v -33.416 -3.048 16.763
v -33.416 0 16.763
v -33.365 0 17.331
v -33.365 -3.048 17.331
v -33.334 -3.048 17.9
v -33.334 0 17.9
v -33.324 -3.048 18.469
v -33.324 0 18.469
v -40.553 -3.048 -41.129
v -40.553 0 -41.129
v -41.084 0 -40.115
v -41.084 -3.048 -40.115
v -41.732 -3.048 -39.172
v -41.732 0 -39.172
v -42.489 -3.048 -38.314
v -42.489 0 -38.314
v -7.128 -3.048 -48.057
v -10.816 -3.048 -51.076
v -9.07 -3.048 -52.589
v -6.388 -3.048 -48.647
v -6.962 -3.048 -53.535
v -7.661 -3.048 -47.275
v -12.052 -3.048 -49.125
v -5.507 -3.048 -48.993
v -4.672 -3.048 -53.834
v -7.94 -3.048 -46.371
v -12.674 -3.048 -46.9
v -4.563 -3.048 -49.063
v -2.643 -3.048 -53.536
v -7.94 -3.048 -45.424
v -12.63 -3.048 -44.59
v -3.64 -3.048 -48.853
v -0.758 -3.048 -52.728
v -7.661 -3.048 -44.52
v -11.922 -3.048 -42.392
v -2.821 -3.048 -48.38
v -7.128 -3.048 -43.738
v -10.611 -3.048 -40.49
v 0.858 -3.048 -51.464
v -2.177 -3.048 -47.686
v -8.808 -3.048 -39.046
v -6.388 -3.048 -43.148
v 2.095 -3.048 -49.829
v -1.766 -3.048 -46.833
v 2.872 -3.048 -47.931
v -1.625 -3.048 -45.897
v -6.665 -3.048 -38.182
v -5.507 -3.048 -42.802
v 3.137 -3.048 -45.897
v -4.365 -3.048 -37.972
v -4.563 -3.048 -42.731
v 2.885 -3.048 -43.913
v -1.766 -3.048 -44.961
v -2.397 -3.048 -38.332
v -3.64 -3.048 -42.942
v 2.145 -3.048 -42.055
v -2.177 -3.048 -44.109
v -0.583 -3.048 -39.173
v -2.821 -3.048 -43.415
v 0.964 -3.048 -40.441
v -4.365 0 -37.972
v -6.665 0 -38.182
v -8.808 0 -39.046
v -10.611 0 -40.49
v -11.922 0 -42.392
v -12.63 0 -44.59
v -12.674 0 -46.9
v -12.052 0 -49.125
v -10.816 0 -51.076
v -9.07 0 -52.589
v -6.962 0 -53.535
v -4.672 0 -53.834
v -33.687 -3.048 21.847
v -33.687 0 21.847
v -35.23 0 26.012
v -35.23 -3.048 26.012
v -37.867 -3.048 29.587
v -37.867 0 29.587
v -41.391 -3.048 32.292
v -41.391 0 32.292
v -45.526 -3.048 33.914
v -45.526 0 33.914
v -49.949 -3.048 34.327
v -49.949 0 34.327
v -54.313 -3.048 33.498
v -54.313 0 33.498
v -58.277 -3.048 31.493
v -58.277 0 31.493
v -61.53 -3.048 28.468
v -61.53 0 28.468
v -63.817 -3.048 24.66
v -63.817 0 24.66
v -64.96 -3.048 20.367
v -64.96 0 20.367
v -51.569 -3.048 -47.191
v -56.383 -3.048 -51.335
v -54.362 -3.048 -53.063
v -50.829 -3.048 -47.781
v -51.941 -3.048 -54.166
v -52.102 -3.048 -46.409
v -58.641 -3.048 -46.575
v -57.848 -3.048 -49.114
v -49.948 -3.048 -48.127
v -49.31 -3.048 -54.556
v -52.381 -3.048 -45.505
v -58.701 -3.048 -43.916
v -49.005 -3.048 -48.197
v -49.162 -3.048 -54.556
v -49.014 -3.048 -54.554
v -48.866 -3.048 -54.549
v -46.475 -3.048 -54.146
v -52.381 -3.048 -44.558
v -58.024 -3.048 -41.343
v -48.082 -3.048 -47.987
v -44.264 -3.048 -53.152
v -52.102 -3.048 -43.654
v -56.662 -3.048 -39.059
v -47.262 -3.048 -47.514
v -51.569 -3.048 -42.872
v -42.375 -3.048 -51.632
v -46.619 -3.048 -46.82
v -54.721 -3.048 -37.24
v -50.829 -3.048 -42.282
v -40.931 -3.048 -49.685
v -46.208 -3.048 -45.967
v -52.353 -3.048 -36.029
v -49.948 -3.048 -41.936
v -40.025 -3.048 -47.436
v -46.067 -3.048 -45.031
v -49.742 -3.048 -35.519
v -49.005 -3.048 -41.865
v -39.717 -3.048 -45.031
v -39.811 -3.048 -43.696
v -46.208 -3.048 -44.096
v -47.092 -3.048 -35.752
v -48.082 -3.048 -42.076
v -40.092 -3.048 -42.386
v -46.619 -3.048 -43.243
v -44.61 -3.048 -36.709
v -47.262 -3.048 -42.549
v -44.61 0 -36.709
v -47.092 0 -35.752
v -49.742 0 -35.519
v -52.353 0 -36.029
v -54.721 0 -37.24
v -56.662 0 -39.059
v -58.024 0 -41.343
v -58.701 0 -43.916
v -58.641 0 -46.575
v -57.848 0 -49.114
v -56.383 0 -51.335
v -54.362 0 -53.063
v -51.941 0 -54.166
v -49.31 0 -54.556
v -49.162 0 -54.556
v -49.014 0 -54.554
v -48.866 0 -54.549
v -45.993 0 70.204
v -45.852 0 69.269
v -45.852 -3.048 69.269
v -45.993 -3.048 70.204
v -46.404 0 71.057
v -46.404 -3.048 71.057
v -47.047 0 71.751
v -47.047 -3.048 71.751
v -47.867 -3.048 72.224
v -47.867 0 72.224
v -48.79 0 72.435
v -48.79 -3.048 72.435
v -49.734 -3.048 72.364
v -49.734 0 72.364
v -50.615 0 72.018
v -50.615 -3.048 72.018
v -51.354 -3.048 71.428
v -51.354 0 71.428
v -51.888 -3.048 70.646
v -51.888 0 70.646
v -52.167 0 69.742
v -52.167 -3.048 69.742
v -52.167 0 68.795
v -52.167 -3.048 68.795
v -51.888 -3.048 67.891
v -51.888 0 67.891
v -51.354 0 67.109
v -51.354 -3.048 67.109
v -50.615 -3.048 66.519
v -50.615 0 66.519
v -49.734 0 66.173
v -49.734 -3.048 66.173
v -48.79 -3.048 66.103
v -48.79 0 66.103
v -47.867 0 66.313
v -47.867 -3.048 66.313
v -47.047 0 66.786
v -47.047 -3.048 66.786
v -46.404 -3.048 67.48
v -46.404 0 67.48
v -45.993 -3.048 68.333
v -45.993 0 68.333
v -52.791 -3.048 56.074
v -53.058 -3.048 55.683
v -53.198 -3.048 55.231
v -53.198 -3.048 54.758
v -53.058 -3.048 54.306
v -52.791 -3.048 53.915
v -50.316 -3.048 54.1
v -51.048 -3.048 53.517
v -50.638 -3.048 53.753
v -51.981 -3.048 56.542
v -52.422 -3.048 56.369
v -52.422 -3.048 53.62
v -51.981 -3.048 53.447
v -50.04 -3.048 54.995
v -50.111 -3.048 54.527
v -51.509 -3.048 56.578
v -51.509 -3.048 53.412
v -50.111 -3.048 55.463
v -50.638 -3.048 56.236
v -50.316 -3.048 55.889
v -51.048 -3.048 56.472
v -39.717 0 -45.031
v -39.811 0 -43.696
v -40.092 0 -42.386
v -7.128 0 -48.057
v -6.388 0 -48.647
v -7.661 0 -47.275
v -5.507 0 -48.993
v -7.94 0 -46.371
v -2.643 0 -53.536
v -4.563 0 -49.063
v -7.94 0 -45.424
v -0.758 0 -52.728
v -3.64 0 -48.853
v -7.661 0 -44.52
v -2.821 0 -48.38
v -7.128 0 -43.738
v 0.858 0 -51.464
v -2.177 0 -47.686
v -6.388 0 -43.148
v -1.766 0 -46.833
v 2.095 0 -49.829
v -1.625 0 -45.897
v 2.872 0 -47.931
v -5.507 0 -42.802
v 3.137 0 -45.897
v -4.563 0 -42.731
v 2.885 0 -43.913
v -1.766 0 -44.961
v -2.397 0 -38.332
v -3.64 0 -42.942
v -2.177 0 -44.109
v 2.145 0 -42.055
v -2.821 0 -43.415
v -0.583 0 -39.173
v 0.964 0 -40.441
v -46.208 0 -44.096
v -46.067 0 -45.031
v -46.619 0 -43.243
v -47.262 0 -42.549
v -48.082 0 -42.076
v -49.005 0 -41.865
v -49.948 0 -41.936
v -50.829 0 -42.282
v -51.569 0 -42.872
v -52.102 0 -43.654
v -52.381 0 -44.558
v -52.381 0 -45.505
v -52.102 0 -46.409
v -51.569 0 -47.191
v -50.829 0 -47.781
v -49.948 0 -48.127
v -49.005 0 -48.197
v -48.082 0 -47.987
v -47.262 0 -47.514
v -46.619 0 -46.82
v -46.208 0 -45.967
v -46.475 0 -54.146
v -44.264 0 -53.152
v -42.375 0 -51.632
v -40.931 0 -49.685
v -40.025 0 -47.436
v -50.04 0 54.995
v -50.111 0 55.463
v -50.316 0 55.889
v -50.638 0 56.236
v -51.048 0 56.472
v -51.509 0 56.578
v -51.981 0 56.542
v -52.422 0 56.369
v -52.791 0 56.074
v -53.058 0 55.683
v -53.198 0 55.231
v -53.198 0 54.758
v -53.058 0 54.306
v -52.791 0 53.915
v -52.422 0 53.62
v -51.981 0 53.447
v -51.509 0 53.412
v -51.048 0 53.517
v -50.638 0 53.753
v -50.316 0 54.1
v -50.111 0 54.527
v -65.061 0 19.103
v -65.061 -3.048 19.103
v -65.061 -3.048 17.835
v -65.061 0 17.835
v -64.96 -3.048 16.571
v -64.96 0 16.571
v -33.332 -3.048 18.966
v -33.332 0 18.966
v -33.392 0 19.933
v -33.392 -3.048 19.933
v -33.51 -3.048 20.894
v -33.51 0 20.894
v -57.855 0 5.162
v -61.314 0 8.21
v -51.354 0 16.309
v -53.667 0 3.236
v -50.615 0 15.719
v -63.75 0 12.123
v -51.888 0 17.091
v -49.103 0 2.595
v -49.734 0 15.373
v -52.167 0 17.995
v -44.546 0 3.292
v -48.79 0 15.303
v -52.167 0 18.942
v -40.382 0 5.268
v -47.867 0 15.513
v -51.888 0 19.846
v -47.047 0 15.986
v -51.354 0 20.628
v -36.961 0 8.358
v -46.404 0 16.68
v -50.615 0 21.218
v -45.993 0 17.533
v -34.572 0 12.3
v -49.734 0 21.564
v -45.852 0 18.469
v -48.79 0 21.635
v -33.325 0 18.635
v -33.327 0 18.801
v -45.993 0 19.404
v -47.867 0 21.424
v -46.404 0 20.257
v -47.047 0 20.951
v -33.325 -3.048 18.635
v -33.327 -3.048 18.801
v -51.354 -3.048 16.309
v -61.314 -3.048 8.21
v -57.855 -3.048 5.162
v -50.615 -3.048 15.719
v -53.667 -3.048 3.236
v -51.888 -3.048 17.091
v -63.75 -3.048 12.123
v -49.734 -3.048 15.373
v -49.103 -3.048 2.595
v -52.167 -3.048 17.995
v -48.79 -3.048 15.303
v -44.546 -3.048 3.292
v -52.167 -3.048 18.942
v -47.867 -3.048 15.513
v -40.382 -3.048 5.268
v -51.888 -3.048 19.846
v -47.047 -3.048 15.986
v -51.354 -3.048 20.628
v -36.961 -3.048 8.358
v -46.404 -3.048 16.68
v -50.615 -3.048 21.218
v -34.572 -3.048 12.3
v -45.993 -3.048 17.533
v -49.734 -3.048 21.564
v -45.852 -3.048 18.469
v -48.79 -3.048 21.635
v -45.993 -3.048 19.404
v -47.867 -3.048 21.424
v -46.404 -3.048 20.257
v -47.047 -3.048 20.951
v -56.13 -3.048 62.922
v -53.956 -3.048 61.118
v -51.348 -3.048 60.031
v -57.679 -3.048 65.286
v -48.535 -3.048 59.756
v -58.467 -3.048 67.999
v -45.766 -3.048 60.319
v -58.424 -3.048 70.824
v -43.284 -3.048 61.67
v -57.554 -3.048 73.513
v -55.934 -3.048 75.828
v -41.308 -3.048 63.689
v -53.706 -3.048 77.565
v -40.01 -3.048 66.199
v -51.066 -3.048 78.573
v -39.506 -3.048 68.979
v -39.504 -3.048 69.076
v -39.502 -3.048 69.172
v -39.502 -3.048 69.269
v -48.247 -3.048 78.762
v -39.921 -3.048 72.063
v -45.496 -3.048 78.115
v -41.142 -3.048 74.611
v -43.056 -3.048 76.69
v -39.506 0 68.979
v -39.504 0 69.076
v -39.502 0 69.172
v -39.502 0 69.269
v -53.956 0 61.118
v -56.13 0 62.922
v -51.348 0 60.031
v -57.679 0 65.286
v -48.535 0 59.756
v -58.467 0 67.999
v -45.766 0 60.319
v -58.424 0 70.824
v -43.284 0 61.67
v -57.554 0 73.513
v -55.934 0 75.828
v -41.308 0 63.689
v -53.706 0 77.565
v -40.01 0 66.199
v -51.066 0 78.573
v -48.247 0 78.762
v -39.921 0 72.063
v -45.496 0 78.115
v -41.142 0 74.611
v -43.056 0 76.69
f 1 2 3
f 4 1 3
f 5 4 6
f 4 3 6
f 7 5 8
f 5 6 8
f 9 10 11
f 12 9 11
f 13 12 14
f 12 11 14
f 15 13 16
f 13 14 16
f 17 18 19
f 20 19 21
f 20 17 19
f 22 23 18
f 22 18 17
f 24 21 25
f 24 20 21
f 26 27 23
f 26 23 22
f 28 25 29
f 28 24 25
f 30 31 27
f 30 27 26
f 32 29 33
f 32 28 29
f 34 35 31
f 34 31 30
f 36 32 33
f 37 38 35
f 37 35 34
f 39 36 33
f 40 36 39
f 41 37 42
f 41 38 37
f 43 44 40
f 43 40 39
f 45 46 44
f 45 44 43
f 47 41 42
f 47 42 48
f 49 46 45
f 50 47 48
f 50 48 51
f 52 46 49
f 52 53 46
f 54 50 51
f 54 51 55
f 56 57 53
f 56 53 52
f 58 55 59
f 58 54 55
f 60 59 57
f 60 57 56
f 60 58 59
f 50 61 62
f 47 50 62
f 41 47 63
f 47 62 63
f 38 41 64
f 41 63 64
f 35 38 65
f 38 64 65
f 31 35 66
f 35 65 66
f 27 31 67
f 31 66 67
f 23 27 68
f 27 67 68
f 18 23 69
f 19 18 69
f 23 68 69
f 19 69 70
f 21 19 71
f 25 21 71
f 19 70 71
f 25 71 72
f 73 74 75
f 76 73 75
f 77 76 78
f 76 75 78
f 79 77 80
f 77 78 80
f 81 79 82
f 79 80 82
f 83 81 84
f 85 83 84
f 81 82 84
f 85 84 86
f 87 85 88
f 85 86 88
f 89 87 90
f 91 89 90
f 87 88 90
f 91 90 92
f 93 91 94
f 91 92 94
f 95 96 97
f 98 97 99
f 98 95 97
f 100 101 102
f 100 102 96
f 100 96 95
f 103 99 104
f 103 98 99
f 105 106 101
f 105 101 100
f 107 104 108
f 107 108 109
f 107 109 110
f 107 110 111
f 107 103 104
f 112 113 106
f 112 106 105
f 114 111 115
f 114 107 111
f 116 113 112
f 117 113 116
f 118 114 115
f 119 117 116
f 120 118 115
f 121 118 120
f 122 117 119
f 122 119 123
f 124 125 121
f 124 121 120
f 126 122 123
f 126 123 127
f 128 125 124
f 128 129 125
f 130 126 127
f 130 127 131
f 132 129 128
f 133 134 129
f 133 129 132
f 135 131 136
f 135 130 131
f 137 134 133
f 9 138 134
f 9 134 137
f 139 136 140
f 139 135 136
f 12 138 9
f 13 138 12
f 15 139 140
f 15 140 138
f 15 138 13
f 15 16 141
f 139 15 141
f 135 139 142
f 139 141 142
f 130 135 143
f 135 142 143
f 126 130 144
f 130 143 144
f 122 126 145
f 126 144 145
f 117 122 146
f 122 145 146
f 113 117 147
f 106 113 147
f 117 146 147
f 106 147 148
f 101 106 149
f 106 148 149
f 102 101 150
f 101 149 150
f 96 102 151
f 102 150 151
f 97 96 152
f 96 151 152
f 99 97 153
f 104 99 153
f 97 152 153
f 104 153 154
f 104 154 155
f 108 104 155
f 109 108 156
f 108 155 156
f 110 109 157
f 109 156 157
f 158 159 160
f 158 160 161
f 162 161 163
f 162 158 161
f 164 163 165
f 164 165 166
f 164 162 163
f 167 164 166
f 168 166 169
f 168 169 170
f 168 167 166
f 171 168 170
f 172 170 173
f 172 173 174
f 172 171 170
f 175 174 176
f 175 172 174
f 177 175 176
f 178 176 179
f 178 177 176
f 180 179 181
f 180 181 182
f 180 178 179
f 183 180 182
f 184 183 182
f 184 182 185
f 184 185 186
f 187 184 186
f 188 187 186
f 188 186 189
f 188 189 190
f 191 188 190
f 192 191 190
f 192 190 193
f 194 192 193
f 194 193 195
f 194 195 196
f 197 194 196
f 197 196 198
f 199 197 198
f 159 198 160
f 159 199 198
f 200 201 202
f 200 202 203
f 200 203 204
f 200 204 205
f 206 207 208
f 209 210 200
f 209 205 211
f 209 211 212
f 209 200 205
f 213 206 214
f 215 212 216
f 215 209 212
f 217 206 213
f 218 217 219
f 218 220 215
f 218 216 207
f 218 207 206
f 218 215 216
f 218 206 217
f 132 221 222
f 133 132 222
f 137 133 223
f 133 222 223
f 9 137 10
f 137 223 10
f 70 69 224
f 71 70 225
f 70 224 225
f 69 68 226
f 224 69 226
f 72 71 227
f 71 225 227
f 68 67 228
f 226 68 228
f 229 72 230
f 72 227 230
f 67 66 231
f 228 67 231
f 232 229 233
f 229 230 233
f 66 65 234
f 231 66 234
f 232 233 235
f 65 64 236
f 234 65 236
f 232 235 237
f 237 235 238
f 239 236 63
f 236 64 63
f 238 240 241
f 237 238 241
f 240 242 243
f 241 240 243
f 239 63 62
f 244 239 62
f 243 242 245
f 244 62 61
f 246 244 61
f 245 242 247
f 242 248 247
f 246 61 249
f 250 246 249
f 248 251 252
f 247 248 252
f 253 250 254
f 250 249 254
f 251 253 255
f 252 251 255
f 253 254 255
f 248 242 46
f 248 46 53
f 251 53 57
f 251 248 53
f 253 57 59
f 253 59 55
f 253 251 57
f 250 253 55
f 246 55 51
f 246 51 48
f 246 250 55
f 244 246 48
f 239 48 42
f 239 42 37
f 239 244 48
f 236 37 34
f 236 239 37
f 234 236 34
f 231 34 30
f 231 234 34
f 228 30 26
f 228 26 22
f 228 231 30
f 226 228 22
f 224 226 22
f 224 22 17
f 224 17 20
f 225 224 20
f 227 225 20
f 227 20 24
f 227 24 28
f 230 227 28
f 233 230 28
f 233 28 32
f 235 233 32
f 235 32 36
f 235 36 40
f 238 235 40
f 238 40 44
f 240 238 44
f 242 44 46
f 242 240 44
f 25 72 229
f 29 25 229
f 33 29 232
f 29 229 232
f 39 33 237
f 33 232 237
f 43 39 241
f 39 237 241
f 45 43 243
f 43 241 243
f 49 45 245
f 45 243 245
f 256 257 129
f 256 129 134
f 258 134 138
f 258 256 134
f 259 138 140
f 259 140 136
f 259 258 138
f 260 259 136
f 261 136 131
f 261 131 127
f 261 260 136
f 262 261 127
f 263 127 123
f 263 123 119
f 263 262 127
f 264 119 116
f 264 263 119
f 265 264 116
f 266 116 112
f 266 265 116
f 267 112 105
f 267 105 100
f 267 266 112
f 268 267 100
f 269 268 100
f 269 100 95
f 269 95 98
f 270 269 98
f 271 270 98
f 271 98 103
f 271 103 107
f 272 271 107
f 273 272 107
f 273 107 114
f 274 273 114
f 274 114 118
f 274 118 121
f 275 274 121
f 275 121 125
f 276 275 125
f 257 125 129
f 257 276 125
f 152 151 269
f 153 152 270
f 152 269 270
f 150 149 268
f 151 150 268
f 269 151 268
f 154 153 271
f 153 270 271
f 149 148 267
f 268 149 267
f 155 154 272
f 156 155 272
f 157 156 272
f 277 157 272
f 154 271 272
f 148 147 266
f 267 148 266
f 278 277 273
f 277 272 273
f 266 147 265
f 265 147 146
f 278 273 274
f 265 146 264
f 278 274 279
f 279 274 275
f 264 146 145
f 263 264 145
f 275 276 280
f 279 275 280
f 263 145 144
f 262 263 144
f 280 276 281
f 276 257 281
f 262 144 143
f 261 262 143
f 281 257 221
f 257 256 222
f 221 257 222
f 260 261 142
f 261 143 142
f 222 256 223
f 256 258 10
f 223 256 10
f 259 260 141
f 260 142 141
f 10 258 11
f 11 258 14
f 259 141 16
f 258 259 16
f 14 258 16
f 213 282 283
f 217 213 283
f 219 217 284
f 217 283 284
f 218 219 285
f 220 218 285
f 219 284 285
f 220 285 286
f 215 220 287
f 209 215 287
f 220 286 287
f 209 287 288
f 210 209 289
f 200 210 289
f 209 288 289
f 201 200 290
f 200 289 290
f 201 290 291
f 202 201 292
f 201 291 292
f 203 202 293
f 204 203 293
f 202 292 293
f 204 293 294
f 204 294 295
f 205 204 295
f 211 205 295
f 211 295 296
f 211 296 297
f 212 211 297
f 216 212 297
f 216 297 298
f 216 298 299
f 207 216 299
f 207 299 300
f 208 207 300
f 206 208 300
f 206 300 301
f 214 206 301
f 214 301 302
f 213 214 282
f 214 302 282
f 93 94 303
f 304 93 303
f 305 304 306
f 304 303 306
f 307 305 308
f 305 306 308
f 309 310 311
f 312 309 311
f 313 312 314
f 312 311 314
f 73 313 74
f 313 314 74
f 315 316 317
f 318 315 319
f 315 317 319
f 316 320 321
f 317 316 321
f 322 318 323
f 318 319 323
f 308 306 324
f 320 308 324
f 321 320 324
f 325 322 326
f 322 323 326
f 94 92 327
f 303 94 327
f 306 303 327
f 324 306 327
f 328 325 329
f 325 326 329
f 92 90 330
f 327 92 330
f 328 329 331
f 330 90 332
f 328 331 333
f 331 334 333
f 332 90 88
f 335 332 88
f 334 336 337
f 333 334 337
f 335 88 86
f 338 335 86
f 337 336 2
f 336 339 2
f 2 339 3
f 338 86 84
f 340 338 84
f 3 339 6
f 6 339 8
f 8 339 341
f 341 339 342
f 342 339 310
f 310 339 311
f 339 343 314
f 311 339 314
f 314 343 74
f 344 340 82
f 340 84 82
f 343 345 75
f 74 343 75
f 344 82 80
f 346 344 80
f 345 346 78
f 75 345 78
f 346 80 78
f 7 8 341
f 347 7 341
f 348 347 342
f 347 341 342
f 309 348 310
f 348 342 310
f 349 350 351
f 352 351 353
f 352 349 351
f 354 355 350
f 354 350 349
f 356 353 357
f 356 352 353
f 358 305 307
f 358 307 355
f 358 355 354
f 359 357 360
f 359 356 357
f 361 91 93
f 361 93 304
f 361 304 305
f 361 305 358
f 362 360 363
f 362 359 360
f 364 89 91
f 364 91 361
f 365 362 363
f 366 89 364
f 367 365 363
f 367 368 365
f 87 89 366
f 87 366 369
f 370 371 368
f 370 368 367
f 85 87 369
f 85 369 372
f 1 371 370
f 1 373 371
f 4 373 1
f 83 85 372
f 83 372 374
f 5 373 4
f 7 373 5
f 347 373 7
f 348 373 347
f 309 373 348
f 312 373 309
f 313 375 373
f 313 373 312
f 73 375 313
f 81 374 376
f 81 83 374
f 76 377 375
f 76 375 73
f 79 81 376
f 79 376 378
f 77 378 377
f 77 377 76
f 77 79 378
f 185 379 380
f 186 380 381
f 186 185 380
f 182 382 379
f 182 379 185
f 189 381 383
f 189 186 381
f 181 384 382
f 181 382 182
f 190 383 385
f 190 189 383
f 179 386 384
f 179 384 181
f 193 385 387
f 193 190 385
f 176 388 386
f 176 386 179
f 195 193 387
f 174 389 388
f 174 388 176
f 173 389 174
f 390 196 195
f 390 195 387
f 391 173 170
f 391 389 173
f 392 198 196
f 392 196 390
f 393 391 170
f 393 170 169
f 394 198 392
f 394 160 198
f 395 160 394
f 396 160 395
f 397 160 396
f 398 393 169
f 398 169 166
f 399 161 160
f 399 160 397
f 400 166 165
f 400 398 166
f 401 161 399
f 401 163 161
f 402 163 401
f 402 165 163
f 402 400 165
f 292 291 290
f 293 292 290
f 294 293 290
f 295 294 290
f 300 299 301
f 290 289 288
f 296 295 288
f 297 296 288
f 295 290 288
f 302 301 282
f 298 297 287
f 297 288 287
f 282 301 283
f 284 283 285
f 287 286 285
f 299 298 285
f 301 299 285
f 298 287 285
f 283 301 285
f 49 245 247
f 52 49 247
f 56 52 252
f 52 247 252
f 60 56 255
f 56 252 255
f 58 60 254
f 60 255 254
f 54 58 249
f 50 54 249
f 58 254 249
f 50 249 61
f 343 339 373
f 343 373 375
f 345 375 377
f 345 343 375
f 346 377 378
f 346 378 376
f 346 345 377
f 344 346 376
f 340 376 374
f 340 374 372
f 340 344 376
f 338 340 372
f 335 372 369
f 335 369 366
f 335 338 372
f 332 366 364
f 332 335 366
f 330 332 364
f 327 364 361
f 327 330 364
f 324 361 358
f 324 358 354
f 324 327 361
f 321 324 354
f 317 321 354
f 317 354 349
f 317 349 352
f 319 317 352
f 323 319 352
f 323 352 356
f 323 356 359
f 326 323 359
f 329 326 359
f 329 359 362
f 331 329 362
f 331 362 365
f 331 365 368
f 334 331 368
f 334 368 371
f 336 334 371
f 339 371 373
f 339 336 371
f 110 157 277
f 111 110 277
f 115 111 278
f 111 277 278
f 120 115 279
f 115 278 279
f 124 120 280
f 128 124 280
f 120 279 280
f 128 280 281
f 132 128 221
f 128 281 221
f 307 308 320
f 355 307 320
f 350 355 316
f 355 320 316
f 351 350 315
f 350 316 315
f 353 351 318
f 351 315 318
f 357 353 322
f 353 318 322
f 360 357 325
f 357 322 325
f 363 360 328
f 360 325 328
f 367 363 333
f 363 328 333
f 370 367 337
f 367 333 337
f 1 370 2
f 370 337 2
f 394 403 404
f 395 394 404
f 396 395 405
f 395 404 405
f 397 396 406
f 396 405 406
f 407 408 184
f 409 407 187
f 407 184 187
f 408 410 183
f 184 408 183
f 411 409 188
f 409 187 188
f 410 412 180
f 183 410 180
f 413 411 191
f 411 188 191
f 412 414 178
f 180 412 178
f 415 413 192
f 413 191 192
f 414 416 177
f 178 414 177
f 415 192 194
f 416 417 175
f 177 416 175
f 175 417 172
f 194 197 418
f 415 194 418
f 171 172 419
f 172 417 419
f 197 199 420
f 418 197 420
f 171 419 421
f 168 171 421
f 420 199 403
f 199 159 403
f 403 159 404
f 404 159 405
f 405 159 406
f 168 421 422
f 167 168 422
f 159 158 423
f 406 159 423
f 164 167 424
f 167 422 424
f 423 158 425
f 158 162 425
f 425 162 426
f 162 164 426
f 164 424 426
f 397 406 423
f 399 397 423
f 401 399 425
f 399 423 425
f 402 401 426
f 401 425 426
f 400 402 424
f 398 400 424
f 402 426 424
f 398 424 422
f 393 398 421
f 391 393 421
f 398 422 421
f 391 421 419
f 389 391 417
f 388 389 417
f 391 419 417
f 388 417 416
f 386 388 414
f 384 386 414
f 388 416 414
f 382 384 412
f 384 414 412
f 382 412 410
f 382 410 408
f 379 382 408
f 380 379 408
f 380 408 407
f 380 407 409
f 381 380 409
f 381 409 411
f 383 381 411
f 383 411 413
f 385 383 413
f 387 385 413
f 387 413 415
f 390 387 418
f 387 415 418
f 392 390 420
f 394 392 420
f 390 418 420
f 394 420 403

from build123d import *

# Parameters (mm, degrees)
F0_R     = 3.175
F1_DEPTH = 3.048
F0_R_2   = 1.5875


with BuildPart() as f1:
    # F0 (on Front) → F1 (new body)
    with BuildSketch(Plane.XZ):
        with BuildLine():
            ThreePointArc((-39.5063975536, 68.9792692733), (-39.5031003941, 69.1239333763), (-39.5020012563, 69.268630874))
            ThreePointArc((-39.5020012563, 69.268630874), (-58.5509021186, 69.4133283718), (-39.5063975536, 68.9792692733))
        make_face()
        with Locations((-49.0270012563, 69.268630874)):
            Circle(F0_R, mode=Mode.SUBTRACT)
    extrude(amount=F1_DEPTH)


with BuildPart() as f1b:
    # F0 (on Front) → F1, piece 2 (new body)
    with BuildSketch(Plane.XZ):
        with BuildLine():
            ThreePointArc((-49.3095952986, -54.5561285654), (-49.0877875384, -54.5551222873), (-48.8660633521, -54.548951363))
            Line((-48.8660633521, -54.548951363), (-49.3095952986, -54.5561285654))
        make_face()
        with BuildLine():
            Line((-49.3095952986, -54.5561285654), (-48.8660633521, -54.548951363))
            ThreePointArc((-48.8660633521, -54.548951363), (-42.3751152762, -51.6323455199), (-39.7169002332, -45.031369126))
            ThreePointArc((-39.7169002332, -45.031369126), (-39.9282457987, -43.0360079871), (-40.5529036084, -41.1291950327))
            Line((-40.5529036084, -41.1291950327), (-42.4889578182, -38.3139742634))
            ThreePointArc((-42.4889578182, -38.3139742634), (-58.0239858126, -41.343470283), (-49.3095952986, -54.5561285654))
        make_face()
        with Locations((-49.2419002332, -45.031369126)):
            Circle(F0_R, mode=Mode.SUBTRACT)
        with BuildLine():
            ThreePointArc((-40.5529036084, -41.1291950327), (-41.3936687559, -39.6340653845), (-42.4889578182, -38.3139742634))
            Line((-42.4889578182, -38.3139742634), (-40.5529036084, -41.1291950327))
        make_face()
    extrude(amount=F1_DEPTH)


with BuildPart() as f1c:
    # F0 (on Front) → F1, piece 3 (new body)
    with BuildSketch(Plane.XZ):
        with BuildLine():
            ThreePointArc((3.1371635102, -45.8973437433), (0.9643130299, -40.4409051461), (-4.364624752, -37.9718114879))
            ThreePointArc((-4.364624752, -37.9718114879), (-12.7363474773, -45.7436041714), (-4.6719096149, -53.8338047171))
            ThreePointArc((-4.6719096149, -53.8338047171), (0.8575471503, -51.4644128974), (3.1371635102, -45.8973437433))
        make_face()
        with Locations((-4.8003364898, -45.8973437433)):
            Circle(F0_R, mode=Mode.SUBTRACT)
    extrude(amount=F1_DEPTH)


with BuildPart() as f1d:
    # F0 (on Front) → F1, piece 4 (new body)
    with BuildSketch(Plane.XZ):
        with BuildLine():
            ThreePointArc((-33.3316972701, 18.9663124906), (-33.443544009, 20.4146315159), (-33.6873111867, 21.8466633784))
            Line((-33.6873111867, 21.8466633784), (-33.3316972701, 18.9663124906))
        make_face()
        with BuildLine():
            Line((-33.3316972701, 18.9663124906), (-33.6873111867, 21.8466633784))
            ThreePointArc((-33.6873111867, 21.8466633784), (-49.9489708596, 34.3267122861), (-64.9600475817, 20.3674583055))
            ThreePointArc((-64.9600475817, 20.3674583055), (-65.073919581, 18.4694411439), (-64.9600475817, 16.5714239823))
            ThreePointArc((-64.9600475817, 16.5714239823), (-49.1025689448, 2.5947335385), (-33.4159137928, 16.7628793108))
            ThreePointArc((-33.4159137928, 16.7628793108), (-33.3469348175, 17.6149213628), (-33.323919581, 18.4694411439))
            ThreePointArc((-33.323919581, 18.4694411439), (-33.3258641224, 18.717907252), (-33.3316972701, 18.9663124906))
        make_face()
        with Locations((-49.0270012563, 18.468630874)):
            Circle(F0_R, mode=Mode.SUBTRACT)
    extrude(amount=F1_DEPTH)


with BuildPart() as f1e:
    # F0 (on Front) → F1, piece 5 (new body)
    with BuildSketch(Plane.XZ):
        with Locations((-51.6277775168, 54.9946411439)):
            Circle(F0_R_2)
    extrude(amount=F1_DEPTH)


solid = Compound([f1.part, f1b.part, f1c.part, f1d.part, f1e.part])
